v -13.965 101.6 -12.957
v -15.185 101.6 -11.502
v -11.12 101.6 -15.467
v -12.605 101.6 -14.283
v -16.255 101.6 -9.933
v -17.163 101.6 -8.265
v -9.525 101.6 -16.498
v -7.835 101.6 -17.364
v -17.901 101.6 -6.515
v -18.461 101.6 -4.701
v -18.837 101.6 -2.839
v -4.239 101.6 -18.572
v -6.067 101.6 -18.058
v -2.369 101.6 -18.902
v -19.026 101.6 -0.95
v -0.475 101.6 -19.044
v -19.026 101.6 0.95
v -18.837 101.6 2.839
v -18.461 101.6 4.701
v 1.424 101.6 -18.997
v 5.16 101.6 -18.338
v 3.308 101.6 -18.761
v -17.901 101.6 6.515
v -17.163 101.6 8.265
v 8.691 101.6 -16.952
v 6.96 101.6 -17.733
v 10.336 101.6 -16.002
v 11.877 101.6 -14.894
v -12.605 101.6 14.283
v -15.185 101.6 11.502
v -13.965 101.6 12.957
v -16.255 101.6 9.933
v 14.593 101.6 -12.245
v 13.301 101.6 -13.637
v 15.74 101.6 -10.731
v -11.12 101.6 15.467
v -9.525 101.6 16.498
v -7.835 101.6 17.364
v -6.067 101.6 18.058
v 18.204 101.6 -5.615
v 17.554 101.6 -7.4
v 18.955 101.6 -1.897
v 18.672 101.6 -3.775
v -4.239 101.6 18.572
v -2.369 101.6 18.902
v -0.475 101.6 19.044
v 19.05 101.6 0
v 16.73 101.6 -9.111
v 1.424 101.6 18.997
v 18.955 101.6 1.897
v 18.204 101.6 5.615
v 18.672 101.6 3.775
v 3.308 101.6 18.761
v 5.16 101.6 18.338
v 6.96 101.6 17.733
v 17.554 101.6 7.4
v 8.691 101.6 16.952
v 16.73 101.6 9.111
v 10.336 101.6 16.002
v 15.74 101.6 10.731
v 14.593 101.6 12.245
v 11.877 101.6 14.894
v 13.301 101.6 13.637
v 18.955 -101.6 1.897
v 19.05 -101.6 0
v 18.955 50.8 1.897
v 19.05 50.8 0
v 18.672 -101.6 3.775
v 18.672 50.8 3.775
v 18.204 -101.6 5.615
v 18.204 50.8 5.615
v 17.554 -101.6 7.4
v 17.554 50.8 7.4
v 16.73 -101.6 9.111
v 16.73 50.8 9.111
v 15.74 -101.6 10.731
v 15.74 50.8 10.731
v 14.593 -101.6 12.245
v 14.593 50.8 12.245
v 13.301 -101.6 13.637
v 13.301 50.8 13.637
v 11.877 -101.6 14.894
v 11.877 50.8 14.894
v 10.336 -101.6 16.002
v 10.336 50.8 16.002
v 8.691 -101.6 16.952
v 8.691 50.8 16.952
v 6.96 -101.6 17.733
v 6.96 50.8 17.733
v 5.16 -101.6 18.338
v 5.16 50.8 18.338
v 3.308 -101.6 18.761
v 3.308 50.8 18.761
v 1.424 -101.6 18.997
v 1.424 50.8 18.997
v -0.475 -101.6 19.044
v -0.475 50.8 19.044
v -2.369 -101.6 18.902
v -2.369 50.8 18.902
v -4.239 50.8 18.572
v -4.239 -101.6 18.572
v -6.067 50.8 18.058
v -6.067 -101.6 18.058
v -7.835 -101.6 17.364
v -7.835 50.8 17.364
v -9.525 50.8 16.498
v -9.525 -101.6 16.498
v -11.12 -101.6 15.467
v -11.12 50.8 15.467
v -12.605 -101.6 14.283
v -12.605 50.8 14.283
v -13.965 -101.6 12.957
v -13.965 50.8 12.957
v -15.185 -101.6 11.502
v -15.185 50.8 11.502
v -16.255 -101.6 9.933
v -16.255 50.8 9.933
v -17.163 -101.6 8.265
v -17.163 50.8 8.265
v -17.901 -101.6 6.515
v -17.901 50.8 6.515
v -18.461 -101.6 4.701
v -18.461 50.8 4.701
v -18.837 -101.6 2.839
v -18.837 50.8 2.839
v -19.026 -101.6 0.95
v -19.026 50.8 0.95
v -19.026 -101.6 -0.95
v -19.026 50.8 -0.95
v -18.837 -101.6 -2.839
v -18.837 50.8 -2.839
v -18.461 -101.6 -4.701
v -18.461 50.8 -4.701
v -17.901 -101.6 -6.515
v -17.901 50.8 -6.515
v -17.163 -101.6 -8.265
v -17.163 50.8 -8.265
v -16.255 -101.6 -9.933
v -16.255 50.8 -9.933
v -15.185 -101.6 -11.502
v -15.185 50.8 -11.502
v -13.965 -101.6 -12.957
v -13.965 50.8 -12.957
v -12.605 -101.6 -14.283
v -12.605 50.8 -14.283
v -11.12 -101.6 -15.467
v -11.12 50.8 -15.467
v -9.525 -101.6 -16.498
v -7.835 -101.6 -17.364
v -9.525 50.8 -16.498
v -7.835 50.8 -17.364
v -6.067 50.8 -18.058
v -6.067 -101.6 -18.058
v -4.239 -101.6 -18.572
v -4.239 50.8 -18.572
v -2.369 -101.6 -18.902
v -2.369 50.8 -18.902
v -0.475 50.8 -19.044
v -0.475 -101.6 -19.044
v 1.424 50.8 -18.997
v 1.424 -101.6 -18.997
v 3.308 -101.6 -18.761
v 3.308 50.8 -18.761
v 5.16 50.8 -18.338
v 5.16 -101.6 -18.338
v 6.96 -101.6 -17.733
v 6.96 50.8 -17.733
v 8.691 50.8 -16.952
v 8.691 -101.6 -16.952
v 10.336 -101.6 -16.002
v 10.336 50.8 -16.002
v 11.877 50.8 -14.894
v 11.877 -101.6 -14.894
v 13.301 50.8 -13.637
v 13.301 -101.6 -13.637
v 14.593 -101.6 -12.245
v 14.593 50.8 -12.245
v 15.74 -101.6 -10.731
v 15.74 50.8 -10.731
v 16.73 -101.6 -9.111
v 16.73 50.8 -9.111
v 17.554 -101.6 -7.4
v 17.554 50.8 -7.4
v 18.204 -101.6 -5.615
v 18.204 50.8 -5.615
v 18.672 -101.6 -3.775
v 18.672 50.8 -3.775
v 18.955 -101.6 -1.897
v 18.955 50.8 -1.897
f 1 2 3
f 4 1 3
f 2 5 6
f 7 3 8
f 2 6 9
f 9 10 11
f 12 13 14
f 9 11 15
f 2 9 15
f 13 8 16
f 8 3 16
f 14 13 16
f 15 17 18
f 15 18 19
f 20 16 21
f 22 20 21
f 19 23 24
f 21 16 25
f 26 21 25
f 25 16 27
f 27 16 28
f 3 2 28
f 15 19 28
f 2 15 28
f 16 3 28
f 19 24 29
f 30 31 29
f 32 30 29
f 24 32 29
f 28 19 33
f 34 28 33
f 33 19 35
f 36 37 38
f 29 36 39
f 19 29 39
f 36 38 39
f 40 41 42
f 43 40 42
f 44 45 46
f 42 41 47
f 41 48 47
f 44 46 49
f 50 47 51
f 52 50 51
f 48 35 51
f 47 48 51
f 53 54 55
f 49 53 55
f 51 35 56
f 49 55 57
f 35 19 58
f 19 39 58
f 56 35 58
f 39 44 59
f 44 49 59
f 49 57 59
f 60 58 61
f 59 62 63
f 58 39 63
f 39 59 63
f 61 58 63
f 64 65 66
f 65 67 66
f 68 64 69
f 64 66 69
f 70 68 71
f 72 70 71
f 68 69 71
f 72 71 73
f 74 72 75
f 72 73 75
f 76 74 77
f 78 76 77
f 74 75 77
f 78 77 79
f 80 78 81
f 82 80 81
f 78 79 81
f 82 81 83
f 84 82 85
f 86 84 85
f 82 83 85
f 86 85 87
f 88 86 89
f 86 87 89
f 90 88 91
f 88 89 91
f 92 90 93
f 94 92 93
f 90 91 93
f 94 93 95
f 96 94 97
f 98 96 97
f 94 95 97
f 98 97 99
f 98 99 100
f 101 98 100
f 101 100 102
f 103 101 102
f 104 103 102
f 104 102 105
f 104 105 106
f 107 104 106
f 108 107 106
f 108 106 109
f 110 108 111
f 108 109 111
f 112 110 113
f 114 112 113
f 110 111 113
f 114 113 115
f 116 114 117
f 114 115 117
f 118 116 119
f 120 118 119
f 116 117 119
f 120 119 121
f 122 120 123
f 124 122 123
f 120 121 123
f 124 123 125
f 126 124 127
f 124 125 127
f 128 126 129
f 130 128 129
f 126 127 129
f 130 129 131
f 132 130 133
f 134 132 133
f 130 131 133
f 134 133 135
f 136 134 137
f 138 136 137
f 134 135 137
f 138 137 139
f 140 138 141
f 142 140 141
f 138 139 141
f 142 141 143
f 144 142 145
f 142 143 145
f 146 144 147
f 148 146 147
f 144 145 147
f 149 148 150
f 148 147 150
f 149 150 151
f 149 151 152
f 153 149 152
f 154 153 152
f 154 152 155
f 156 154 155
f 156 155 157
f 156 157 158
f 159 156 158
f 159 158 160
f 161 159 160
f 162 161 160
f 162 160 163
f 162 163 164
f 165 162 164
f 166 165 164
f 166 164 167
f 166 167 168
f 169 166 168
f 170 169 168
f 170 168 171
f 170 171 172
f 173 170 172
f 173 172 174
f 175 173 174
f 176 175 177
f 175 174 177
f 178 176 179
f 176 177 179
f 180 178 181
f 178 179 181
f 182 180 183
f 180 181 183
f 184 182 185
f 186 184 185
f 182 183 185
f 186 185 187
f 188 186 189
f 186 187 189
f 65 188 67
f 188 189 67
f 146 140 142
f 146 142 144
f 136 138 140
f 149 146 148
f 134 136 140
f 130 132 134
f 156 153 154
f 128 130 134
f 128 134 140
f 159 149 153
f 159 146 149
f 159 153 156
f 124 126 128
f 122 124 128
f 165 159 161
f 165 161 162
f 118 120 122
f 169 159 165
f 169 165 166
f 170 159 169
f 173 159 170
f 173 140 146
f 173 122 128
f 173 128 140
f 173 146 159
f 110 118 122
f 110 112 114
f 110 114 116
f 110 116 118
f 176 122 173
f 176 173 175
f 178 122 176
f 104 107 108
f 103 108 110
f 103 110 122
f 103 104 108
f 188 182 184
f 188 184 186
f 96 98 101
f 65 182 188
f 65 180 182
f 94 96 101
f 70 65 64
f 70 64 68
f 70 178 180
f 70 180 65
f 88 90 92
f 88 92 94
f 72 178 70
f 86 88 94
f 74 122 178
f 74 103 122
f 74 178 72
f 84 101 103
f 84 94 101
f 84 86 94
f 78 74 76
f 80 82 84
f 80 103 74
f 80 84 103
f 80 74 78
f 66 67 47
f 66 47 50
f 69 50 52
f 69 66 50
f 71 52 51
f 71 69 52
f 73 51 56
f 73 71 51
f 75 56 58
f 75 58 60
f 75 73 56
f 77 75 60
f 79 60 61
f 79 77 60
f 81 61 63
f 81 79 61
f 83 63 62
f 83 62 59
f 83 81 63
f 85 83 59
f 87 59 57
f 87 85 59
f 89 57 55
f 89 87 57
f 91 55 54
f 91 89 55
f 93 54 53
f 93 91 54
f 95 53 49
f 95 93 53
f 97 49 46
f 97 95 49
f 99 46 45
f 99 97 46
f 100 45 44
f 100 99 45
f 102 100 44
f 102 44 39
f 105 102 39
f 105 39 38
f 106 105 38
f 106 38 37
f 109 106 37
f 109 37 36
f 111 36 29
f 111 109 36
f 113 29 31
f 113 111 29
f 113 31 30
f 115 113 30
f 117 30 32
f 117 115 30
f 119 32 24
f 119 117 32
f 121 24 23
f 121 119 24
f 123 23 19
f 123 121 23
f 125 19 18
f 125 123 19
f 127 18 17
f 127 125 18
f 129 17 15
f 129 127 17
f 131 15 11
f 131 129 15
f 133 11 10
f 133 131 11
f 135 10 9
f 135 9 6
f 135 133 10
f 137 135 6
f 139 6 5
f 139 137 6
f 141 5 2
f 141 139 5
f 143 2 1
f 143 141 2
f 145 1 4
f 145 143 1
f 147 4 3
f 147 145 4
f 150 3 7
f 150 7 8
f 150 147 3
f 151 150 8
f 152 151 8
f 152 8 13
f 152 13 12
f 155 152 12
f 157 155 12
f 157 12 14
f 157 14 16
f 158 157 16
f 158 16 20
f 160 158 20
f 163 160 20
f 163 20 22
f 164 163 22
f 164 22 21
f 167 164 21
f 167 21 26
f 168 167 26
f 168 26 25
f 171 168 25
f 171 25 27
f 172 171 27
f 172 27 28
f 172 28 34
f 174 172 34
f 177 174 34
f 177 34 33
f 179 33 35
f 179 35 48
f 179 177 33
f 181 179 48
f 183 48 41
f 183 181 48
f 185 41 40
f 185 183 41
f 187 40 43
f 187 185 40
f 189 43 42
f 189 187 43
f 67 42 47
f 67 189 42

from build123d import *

# Parameters (mm, degrees)
F0_R     = 19.05
F1_DEPTH = 50.8
F2_DEPTH = 50.8
F3_DEPTH = 50.8


with BuildPart() as f1:
    # F0 (on Front) → F1 (new body, symmetric)
    with BuildSketch(Plane.XZ):
        Circle(F0_R)
    extrude(amount=F1_DEPTH, both=True)

    # F2 (add): a face of the model
    f2_faces = [f1.faces().sort_by_distance(p)[0] for p in [
        (0, -50.8, 0),
    ]]
    extrude(f2_faces, amount=F2_DEPTH)

    # F3 (add): a face of the model
    f3_faces = [f1.faces().sort_by_distance(p)[0] for p in [
        (0, 50.8, 0),
    ]]
    extrude(f3_faces, amount=F3_DEPTH)


solid = f1.part
